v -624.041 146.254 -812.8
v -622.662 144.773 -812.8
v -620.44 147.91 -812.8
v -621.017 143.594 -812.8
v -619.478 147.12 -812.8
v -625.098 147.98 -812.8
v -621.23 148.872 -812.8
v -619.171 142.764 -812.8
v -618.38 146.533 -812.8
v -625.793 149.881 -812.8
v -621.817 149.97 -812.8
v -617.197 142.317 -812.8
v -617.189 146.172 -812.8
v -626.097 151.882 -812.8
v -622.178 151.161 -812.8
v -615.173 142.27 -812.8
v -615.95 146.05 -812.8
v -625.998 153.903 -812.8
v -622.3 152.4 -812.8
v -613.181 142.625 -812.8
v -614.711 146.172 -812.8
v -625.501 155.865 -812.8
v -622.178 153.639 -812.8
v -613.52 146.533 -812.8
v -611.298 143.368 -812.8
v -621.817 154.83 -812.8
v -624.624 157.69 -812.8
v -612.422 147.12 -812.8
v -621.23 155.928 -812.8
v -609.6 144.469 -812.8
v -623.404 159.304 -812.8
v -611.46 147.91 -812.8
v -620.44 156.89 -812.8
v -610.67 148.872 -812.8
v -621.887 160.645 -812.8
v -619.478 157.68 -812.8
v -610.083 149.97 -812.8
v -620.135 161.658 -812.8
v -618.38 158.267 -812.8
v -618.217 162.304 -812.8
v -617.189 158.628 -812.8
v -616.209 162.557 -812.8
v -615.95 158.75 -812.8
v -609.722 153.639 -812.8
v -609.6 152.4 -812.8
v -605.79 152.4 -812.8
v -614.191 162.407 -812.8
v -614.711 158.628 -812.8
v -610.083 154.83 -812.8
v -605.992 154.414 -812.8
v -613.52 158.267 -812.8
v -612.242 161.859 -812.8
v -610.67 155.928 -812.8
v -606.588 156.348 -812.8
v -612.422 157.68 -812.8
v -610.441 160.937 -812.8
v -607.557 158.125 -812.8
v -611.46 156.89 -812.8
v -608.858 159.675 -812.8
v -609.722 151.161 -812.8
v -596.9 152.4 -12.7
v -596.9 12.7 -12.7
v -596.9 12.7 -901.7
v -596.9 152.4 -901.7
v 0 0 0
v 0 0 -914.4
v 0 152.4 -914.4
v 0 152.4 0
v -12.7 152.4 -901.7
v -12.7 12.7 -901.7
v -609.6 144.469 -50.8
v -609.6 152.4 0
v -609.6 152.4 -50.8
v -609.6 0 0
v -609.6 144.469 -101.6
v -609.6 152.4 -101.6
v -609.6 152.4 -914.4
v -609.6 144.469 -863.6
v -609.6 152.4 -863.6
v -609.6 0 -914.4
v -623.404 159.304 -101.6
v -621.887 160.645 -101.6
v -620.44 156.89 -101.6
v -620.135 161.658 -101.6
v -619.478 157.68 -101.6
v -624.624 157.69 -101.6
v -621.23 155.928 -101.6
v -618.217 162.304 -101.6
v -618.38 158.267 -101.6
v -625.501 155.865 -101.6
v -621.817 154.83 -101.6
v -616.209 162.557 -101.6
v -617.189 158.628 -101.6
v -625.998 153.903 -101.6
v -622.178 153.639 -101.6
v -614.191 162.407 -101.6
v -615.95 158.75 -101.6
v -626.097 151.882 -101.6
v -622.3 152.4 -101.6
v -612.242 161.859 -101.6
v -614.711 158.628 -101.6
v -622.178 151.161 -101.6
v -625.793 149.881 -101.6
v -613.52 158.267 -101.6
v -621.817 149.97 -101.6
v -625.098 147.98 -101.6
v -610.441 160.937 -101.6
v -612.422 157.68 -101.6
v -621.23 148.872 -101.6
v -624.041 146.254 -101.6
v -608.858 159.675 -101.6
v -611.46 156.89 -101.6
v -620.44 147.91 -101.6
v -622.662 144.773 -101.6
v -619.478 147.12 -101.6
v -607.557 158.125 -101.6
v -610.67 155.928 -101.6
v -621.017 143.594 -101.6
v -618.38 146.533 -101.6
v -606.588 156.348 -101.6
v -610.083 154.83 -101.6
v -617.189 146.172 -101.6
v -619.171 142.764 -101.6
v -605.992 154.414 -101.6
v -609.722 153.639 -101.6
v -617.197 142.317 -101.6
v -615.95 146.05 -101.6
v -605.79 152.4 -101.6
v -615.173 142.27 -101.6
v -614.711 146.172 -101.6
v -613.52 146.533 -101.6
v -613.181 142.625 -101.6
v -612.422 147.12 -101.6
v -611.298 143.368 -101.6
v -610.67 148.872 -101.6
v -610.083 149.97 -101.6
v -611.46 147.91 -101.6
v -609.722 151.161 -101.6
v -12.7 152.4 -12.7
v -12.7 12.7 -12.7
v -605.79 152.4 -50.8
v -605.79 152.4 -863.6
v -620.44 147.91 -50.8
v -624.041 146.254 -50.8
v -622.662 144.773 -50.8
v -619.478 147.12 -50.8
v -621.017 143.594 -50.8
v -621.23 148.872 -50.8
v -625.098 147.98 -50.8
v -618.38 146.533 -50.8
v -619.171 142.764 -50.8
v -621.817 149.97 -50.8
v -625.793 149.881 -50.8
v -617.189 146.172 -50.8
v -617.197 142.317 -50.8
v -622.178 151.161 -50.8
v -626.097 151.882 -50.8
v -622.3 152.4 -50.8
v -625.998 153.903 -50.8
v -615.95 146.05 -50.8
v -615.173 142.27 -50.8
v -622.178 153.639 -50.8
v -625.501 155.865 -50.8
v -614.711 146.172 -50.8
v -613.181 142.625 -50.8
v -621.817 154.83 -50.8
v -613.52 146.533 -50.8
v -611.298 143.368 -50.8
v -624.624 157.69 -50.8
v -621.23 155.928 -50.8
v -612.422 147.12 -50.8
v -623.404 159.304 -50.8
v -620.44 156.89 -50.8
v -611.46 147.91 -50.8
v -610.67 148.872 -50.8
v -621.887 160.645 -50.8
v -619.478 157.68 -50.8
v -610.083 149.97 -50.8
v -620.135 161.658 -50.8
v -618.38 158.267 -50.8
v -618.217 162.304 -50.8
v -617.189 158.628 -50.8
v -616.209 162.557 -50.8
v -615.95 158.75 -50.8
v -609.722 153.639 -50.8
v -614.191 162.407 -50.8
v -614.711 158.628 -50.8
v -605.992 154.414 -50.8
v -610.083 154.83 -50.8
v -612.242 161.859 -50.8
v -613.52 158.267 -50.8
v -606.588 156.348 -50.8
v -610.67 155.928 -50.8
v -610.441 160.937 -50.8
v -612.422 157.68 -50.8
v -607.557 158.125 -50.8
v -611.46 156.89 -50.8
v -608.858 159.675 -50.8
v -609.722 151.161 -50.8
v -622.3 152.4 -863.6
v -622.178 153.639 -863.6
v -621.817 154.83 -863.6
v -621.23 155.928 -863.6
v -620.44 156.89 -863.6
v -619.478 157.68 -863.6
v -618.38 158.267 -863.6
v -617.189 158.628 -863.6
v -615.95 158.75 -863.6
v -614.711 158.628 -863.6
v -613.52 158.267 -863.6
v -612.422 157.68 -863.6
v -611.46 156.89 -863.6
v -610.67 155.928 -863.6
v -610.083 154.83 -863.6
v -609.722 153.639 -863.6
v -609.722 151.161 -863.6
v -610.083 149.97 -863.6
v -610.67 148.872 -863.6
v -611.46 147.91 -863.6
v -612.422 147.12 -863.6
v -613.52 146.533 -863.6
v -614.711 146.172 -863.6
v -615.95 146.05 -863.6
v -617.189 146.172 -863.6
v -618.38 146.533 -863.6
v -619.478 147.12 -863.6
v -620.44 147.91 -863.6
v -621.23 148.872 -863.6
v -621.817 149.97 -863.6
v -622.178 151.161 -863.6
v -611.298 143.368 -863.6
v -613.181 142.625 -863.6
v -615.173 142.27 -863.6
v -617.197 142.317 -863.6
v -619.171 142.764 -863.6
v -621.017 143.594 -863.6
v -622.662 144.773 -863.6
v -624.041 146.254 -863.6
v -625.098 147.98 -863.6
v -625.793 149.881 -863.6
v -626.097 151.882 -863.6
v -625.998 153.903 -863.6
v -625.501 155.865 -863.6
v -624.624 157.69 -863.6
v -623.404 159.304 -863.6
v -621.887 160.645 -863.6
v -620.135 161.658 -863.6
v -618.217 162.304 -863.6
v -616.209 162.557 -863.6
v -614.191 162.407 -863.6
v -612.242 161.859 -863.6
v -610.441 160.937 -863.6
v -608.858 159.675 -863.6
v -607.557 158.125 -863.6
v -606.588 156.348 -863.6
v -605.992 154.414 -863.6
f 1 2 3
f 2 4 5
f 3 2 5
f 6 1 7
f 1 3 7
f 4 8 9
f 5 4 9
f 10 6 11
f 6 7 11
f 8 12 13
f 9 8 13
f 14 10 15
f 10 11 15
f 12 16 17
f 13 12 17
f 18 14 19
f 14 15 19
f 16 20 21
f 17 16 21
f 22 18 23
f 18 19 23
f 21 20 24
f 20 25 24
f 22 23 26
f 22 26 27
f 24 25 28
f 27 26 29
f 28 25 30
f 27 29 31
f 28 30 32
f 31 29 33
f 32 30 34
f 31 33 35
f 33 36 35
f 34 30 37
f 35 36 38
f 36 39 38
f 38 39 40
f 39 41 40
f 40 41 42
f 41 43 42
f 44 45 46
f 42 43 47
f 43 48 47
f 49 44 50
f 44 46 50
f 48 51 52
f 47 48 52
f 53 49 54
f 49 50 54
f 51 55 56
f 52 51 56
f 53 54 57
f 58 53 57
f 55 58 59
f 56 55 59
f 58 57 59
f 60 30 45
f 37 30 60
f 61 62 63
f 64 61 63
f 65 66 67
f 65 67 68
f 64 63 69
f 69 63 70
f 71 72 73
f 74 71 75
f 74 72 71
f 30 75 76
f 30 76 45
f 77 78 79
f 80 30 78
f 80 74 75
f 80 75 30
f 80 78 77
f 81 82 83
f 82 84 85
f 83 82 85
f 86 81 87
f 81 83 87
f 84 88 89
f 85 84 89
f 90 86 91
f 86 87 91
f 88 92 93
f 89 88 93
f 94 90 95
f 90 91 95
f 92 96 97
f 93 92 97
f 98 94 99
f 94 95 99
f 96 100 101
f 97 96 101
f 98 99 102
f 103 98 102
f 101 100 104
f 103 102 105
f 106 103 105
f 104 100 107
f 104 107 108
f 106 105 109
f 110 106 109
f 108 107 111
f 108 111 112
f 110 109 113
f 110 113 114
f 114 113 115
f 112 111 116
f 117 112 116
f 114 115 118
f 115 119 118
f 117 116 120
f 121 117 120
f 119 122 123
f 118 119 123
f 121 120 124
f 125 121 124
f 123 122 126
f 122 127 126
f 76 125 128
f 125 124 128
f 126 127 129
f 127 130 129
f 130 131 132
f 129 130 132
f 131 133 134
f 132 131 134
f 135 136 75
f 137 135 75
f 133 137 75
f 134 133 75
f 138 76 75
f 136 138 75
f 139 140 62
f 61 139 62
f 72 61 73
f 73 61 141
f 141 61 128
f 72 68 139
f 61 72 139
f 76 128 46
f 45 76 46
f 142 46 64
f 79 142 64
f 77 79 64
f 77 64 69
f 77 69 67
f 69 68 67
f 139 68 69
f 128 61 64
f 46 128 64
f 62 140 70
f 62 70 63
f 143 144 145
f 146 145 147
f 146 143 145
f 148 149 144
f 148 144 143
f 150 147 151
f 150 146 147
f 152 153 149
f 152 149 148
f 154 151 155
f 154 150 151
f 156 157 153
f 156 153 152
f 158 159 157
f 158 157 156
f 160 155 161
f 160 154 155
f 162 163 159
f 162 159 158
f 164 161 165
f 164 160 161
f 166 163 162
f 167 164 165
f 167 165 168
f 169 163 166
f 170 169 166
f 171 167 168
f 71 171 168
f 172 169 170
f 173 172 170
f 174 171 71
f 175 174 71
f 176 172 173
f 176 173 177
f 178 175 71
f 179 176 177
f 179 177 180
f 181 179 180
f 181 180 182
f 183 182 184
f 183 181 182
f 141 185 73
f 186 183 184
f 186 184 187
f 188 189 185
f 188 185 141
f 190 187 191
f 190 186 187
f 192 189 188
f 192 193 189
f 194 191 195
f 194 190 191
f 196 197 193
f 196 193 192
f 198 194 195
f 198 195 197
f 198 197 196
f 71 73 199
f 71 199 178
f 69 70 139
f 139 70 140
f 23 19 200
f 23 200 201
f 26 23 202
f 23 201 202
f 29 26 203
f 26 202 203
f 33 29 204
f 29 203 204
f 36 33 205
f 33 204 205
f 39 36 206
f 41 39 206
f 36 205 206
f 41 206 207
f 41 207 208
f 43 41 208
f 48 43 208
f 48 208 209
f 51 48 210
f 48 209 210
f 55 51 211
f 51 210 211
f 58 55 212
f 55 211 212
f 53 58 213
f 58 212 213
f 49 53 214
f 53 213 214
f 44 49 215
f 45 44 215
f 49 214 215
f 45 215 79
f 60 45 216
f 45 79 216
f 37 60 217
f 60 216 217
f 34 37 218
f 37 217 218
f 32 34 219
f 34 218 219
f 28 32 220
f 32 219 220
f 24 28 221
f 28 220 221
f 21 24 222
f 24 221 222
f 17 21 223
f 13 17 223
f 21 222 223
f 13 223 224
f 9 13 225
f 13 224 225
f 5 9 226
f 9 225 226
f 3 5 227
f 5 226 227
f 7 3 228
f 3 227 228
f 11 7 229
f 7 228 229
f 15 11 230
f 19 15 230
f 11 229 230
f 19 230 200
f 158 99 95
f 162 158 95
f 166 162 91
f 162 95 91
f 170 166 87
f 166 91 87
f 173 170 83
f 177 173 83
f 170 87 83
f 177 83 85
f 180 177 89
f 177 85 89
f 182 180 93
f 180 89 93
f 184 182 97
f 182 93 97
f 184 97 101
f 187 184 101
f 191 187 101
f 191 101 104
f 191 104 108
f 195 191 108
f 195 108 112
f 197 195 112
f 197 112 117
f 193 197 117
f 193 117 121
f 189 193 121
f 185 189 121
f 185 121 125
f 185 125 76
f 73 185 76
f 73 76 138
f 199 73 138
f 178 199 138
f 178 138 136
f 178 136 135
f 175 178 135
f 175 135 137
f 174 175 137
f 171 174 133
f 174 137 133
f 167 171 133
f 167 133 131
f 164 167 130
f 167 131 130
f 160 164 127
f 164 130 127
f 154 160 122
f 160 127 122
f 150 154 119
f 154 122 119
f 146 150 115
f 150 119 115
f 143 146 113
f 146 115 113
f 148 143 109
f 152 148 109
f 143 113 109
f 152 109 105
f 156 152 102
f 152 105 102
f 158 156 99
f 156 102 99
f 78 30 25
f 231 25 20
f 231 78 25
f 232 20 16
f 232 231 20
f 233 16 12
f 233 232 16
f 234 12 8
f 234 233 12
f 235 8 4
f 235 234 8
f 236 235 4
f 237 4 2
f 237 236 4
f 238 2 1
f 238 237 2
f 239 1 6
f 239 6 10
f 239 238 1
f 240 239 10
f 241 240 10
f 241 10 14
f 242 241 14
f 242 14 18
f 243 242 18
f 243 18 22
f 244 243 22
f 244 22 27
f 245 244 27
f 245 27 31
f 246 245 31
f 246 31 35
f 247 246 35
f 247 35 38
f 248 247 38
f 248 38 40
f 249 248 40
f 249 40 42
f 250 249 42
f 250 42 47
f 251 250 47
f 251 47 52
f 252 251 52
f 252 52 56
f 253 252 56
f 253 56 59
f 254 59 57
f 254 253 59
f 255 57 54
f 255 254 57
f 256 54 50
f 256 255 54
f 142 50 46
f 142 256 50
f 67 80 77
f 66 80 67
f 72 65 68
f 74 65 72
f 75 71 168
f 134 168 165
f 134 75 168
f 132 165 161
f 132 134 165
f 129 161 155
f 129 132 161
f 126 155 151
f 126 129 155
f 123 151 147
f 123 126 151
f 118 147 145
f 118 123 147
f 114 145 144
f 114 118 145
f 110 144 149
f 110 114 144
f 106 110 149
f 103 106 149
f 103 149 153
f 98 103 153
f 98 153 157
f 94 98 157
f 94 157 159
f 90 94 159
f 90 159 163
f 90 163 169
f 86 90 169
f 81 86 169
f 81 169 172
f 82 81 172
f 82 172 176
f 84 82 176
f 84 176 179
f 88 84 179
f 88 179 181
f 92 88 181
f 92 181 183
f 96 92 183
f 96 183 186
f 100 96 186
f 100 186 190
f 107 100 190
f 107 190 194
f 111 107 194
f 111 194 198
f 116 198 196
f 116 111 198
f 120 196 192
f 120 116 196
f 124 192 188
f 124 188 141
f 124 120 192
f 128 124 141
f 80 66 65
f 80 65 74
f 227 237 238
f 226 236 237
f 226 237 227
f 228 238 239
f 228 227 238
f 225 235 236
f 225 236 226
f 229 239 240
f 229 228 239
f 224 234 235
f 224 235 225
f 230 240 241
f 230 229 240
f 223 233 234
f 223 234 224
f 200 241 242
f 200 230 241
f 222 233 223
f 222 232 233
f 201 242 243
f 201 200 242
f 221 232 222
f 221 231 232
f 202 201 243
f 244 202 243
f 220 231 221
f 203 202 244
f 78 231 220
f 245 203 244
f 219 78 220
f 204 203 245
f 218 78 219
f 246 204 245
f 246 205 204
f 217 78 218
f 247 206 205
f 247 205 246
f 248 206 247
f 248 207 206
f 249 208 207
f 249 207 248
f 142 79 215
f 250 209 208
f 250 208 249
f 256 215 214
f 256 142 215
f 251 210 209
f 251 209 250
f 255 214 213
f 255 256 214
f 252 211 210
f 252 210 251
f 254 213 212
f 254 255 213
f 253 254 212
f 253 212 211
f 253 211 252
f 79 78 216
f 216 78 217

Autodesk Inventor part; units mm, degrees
ref_plane "YZ Plane" through (0, 0, 0) normal (1, 0, 0) x (0, 1, 0)
ref_plane "XZ Plane" through (0, 0, 0) normal (0, 1, 0) x (-1, 0, 0)
ref_plane "XY Plane" through (0, 0, 0) normal (0, 0, 1) x (1, 0, 0)
sketch "Sketch1" plane through (0, 0, 0) normal (0, 1, 0) x (-1, 0, 0)
  line L0 (0, 0) -> (609.6, 0)
  line L1 (609.6, 0) -> (609.6, -914.4)
  line L2 (609.6, -914.4) -> (0, -914.4)
  line L3 (0, -914.4) -> (0, 0)
  dimension "d0" = 609.6
  dimension "d1" = 914.4
extrude "Extrusion1" add sketch "Sketch1" along normal blind 152.4
shell "Shell1" thickness 12.7 removed faces 1 at (-203.2, 152.4, -304.8)
sketch "Sketch2" plane through (0, 0, -914.4) normal (0, 0, -1) x (-1, 0, 0)
  line L0 (596.9, 152.4) -> (12.7, 152.4) projected
  circle A0 centre (615.95, 152.4) radius 10.16
  circle A1 centre (615.95, 152.4) radius 6.35
  line L1 (609.6, 0) -> (609.6, 152.4) projected
  point P0 (0, 0)
  dimension "d5" = 12.7
  dimension "d6" = 20.32
  dimension "d7" = 6.35
extrude "Extrusion2" add sketch "Sketch2" against normal up to surface (914.4 mm away)
sketch "Sketch3" plane through (0, 152.4, 0) normal (0, 1, 0) x (1, 0, 0)
  point P0 (0, 0)
sketch "Sketch4" plane through (0, 0, 0) normal (1, 0, 0) x (0, 0, -1)
  line L0 (0, 0) -> (0, 152.4) projected
  line L1 (0, 152.4) -> (50.8, 152.4)
  line L2 (50.8, 152.4) -> (50.8, 178.2149)
  line L3 (50.8, 178.2149) -> (0, 178.2149)
  line L4 (0, 178.2149) -> (0, 152.4)
  line L5 (914.4, 152.4) -> (863.6, 152.4)
  line L6 (863.6, 152.4) -> (863.6, 178.2149)
  line L7 (863.6, 178.2149) -> (914.4, 178.2149)
  line L8 (914.4, 178.2149) -> (914.4, 152.4)
  line L9 (0, 152.4) -> (914.4, 152.4) projected
  line L10 (101.6, 152.4) -> (812.8, 152.4)
  line L11 (812.8, 152.4) -> (812.8, 202.1874)
  line L12 (812.8, 202.1874) -> (101.6, 202.1874)
  line L13 (101.6, 202.1874) -> (101.6, 152.4)
  dimension "d10" = 50.8
  dimension "d11" = 50.8
  dimension "d12" = 50.8
  dimension "d13" = 50.8
extrude "Extrusion3" cut sketch "Sketch4" against normal through all
sketch "Sketch5" plane through (0, 152.4, 0) normal (0, 1, 0) x (1, 0, 0)
  line L0 (-609.6, 0) -> (-609.6, 914.4) projected
  line L1 (-609.6, 0) -> (-640.6567, 0)
  line L2 (-640.6567, 0) -> (-640.6567, 50.8)
  line L3 (-640.6567, 50.8) -> (-609.6, 50.8)
  line L4 (-609.6, 50.8) -> (-609.6, 0)
  line L5 (-609.6, 101.6) -> (-609.6, 812.8) projected
  line L6 (-609.6, 101.6) -> (-640.6567, 101.6)
  line L7 (-640.6567, 101.6) -> (-640.6567, 812.8)
  line L8 (-640.6567, 812.8) -> (-609.6, 812.8)
  line L9 (-609.6, 812.8) -> (-609.6, 101.6)
  line L10 (-609.6, 863.6) -> (-609.6, 914.4) projected
  line L11 (-609.6, 863.6) -> (-644.9488, 863.6)
  line L12 (-644.9488, 863.6) -> (-644.9488, 914.4)
  line L13 (-644.9488, 914.4) -> (-609.6, 914.4)
  line L14 (-609.6, 914.4) -> (-609.6, 863.6)
  point P0 (0, 0)
extrude "Extrusion4" cut sketch "Sketch5" against normal blind 25.4
properties part number "chestLower"
